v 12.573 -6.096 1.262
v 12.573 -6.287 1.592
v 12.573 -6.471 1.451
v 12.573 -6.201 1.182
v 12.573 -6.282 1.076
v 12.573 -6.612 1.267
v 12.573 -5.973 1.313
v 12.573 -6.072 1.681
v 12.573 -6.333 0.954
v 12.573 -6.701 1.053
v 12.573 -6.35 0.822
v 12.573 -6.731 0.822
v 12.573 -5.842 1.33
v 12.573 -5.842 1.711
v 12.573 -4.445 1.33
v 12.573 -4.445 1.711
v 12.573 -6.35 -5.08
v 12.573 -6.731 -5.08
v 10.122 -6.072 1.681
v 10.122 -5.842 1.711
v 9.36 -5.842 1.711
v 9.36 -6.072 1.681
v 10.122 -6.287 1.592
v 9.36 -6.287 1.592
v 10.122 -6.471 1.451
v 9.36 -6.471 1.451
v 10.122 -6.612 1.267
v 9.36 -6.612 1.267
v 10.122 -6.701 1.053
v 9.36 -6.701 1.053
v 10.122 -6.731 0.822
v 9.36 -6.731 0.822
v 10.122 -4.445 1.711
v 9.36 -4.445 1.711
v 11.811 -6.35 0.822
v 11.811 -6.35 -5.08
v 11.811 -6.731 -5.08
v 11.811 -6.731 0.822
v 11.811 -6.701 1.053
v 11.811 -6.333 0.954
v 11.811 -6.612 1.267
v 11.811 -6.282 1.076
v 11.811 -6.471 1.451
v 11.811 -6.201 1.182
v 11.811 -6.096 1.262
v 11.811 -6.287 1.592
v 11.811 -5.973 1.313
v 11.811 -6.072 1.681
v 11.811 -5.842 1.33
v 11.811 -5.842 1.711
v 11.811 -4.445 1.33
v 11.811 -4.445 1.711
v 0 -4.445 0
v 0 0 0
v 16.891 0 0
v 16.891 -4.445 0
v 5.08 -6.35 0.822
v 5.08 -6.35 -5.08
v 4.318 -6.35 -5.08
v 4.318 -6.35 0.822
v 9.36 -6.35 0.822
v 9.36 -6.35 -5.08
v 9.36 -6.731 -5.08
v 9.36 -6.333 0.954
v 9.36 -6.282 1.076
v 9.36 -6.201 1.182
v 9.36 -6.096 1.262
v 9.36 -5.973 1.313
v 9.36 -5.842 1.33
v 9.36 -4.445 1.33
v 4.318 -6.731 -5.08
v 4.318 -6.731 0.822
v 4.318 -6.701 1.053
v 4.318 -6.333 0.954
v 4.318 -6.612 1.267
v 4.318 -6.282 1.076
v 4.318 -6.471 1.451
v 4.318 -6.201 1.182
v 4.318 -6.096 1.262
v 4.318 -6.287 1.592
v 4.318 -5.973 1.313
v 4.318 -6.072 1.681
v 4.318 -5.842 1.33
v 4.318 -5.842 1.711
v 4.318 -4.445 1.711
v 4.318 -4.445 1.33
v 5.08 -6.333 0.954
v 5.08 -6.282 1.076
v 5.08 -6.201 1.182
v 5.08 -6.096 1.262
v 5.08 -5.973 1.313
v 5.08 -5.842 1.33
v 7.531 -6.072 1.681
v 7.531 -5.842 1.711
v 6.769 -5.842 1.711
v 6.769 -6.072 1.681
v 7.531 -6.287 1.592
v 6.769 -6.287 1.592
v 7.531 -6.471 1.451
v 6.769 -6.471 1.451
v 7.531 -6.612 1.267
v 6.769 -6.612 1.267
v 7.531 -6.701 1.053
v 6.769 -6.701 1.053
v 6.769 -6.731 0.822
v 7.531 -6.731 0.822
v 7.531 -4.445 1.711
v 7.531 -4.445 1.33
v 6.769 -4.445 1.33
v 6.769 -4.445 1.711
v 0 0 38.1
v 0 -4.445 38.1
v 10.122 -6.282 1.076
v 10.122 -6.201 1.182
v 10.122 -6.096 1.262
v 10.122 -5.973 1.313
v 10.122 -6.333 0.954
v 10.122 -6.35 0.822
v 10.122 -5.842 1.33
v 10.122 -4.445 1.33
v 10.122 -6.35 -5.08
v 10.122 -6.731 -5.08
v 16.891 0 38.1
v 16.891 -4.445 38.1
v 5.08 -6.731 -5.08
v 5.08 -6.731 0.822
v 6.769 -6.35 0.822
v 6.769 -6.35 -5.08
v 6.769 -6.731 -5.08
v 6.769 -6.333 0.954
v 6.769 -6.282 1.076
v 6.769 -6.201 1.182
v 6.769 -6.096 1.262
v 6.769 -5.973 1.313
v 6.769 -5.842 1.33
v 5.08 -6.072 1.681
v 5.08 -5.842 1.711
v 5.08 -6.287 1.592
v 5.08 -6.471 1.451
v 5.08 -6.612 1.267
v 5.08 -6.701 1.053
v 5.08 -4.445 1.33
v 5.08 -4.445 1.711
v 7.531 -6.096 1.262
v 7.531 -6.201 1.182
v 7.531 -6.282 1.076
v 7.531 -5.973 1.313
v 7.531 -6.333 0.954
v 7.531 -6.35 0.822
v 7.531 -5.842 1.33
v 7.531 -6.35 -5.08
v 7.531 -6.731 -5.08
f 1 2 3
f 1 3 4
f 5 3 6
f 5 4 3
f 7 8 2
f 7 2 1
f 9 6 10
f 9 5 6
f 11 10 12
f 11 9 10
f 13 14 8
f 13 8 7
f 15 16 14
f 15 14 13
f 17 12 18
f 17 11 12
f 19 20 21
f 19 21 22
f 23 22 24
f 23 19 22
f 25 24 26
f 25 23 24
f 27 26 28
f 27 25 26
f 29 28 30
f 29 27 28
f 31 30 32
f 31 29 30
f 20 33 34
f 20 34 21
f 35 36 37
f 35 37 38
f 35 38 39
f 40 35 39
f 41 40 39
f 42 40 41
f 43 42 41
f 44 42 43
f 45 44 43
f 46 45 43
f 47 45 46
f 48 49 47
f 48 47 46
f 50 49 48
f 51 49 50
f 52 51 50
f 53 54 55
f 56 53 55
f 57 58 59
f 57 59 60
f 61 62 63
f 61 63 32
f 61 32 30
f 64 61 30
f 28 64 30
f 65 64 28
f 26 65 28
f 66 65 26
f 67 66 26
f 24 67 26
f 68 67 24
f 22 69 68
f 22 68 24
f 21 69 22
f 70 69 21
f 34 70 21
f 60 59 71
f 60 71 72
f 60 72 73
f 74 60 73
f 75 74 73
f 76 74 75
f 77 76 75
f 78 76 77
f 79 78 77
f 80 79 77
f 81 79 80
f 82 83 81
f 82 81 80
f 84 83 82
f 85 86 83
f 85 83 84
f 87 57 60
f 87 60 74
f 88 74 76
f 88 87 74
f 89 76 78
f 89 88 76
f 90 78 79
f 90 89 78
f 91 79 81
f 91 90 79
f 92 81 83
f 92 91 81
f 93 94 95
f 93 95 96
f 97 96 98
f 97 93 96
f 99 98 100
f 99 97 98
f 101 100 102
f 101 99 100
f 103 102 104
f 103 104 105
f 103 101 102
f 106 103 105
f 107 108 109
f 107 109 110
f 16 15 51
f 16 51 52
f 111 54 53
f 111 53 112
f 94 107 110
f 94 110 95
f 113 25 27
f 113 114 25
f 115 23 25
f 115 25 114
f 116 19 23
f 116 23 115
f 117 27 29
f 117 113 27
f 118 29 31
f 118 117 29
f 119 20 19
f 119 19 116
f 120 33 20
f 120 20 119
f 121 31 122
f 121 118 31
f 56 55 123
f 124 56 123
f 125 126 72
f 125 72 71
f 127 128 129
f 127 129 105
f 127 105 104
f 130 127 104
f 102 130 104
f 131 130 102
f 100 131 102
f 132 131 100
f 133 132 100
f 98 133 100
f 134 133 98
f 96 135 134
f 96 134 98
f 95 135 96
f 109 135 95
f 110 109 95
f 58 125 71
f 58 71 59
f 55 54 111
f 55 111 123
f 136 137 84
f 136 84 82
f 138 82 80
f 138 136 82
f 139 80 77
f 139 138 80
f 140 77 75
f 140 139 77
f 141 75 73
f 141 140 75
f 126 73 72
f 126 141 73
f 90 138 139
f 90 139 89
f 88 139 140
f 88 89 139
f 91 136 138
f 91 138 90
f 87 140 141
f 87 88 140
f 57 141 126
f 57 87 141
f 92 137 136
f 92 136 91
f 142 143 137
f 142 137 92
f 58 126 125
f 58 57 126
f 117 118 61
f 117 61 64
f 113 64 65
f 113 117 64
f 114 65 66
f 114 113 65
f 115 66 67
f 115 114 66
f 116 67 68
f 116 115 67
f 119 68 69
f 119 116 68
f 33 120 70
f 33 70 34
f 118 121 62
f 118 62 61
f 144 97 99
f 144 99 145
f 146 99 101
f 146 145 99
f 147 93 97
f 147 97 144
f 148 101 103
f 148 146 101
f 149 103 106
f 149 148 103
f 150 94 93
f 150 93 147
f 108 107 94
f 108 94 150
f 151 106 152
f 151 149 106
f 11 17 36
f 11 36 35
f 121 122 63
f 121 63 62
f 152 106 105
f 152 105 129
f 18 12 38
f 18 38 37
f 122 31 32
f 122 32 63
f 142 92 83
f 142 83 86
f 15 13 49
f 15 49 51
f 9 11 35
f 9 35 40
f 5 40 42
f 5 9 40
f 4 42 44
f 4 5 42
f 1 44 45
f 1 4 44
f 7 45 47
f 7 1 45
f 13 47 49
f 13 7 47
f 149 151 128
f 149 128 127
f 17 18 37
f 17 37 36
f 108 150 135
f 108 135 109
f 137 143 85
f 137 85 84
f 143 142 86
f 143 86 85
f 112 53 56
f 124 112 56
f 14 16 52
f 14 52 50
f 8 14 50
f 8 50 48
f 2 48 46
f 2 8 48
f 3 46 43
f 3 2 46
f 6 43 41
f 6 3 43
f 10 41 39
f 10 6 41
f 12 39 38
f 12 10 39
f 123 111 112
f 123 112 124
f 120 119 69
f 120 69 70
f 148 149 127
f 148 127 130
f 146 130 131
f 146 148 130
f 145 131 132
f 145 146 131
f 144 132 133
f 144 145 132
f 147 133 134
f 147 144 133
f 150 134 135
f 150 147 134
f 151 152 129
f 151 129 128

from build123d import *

# Parameters (mm, degrees)
F0_W     = 16.891
F0_H     = 38.1
F1_DEPTH = 4.445
F3_DEPTH = 16.891
F4_W     = 4.318
F4_H     = 3.068709
F4_W_2   = 1.8288
F4_H_2   = 6.30698
F5_DEPTH = 25.4


with BuildPart() as f1:
    # F0 (on Front) → F1 (new body)
    with BuildSketch(Plane.XZ):
        with Locations((8.4455, 19.05)):
            Rectangle(F0_W, F0_H)
    extrude(amount=F1_DEPTH)


with BuildPart() as f3:
    # F2 (on face) → F3 (new body, through all)
    with BuildSketch(Plane.YZ.offset(16.891)):
        with BuildLine():
            Line((-6.731, -5.08), (-6.35, -5.08))
            Line((-6.35, -5.08), (-6.35, 0.822423))
            ThreePointArc((-6.35, 0.822423), (-6.20121, 1.181633), (-5.842, 1.330423))
            Line((-5.842, 1.330423), (-4.445, 1.330423))
            Line((-4.445, 1.330423), (-4.445, 1.711423))
            Line((-4.445, 1.711423), (-5.842, 1.711423))
            ThreePointArc((-5.842, 1.711423), (-6.470618, 1.451041), (-6.731, 0.822423))
            Line((-6.731, 0.822423), (-6.731, -5.08))
        make_face()
    extrude(amount=-F3_DEPTH)

    # F4 (on face) → F5 (cut)
    with BuildSketch(Plane.XZ.offset(4.445)):
        Polygon((17.909975, 3.068709), (16.891, 3.068709), (16.891, 0), (12.573, 0), (12.573, -6.235953), (17.909975, -6.235953), align=None)
        with Locations((14.732, 1.534354)):
            Rectangle(F4_W, F4_H)
        Polygon((-1.018975, -6.235953), (4.318, -6.235953), (4.318, 0), (0, 0), (0, 3.068709), (-1.018975, 3.068709), align=None)
        with Locations((2.159, 1.534354)):
            Rectangle(F4_W, F4_H)
        Polygon((6.7691, 0), (5.08, 0), (5.08, -6.30698), (6.7691, -6.378009), align=None)
        Polygon((5.08, 2.997681), (5.08, 0), (6.7691, 0), (6.7691, 3.210765), align=None)
        with Locations((8.4455, 1.534354)):
            Rectangle(F4_W_2, F4_H)
        Polygon((10.1219, 3.210765), (10.1219, 0), (11.811, 0), (11.811, 2.997681), align=None)
        Polygon((11.811, 0), (10.1219, 0), (10.1219, -6.378009), (11.811, -6.30698), align=None)
        with Locations((8.4455, -3.15349)):
            Rectangle(F4_W_2, F4_H_2)
    extrude(amount=F5_DEPTH, mode=Mode.SUBTRACT)


solid = Compound([f1.part, f3.part])
